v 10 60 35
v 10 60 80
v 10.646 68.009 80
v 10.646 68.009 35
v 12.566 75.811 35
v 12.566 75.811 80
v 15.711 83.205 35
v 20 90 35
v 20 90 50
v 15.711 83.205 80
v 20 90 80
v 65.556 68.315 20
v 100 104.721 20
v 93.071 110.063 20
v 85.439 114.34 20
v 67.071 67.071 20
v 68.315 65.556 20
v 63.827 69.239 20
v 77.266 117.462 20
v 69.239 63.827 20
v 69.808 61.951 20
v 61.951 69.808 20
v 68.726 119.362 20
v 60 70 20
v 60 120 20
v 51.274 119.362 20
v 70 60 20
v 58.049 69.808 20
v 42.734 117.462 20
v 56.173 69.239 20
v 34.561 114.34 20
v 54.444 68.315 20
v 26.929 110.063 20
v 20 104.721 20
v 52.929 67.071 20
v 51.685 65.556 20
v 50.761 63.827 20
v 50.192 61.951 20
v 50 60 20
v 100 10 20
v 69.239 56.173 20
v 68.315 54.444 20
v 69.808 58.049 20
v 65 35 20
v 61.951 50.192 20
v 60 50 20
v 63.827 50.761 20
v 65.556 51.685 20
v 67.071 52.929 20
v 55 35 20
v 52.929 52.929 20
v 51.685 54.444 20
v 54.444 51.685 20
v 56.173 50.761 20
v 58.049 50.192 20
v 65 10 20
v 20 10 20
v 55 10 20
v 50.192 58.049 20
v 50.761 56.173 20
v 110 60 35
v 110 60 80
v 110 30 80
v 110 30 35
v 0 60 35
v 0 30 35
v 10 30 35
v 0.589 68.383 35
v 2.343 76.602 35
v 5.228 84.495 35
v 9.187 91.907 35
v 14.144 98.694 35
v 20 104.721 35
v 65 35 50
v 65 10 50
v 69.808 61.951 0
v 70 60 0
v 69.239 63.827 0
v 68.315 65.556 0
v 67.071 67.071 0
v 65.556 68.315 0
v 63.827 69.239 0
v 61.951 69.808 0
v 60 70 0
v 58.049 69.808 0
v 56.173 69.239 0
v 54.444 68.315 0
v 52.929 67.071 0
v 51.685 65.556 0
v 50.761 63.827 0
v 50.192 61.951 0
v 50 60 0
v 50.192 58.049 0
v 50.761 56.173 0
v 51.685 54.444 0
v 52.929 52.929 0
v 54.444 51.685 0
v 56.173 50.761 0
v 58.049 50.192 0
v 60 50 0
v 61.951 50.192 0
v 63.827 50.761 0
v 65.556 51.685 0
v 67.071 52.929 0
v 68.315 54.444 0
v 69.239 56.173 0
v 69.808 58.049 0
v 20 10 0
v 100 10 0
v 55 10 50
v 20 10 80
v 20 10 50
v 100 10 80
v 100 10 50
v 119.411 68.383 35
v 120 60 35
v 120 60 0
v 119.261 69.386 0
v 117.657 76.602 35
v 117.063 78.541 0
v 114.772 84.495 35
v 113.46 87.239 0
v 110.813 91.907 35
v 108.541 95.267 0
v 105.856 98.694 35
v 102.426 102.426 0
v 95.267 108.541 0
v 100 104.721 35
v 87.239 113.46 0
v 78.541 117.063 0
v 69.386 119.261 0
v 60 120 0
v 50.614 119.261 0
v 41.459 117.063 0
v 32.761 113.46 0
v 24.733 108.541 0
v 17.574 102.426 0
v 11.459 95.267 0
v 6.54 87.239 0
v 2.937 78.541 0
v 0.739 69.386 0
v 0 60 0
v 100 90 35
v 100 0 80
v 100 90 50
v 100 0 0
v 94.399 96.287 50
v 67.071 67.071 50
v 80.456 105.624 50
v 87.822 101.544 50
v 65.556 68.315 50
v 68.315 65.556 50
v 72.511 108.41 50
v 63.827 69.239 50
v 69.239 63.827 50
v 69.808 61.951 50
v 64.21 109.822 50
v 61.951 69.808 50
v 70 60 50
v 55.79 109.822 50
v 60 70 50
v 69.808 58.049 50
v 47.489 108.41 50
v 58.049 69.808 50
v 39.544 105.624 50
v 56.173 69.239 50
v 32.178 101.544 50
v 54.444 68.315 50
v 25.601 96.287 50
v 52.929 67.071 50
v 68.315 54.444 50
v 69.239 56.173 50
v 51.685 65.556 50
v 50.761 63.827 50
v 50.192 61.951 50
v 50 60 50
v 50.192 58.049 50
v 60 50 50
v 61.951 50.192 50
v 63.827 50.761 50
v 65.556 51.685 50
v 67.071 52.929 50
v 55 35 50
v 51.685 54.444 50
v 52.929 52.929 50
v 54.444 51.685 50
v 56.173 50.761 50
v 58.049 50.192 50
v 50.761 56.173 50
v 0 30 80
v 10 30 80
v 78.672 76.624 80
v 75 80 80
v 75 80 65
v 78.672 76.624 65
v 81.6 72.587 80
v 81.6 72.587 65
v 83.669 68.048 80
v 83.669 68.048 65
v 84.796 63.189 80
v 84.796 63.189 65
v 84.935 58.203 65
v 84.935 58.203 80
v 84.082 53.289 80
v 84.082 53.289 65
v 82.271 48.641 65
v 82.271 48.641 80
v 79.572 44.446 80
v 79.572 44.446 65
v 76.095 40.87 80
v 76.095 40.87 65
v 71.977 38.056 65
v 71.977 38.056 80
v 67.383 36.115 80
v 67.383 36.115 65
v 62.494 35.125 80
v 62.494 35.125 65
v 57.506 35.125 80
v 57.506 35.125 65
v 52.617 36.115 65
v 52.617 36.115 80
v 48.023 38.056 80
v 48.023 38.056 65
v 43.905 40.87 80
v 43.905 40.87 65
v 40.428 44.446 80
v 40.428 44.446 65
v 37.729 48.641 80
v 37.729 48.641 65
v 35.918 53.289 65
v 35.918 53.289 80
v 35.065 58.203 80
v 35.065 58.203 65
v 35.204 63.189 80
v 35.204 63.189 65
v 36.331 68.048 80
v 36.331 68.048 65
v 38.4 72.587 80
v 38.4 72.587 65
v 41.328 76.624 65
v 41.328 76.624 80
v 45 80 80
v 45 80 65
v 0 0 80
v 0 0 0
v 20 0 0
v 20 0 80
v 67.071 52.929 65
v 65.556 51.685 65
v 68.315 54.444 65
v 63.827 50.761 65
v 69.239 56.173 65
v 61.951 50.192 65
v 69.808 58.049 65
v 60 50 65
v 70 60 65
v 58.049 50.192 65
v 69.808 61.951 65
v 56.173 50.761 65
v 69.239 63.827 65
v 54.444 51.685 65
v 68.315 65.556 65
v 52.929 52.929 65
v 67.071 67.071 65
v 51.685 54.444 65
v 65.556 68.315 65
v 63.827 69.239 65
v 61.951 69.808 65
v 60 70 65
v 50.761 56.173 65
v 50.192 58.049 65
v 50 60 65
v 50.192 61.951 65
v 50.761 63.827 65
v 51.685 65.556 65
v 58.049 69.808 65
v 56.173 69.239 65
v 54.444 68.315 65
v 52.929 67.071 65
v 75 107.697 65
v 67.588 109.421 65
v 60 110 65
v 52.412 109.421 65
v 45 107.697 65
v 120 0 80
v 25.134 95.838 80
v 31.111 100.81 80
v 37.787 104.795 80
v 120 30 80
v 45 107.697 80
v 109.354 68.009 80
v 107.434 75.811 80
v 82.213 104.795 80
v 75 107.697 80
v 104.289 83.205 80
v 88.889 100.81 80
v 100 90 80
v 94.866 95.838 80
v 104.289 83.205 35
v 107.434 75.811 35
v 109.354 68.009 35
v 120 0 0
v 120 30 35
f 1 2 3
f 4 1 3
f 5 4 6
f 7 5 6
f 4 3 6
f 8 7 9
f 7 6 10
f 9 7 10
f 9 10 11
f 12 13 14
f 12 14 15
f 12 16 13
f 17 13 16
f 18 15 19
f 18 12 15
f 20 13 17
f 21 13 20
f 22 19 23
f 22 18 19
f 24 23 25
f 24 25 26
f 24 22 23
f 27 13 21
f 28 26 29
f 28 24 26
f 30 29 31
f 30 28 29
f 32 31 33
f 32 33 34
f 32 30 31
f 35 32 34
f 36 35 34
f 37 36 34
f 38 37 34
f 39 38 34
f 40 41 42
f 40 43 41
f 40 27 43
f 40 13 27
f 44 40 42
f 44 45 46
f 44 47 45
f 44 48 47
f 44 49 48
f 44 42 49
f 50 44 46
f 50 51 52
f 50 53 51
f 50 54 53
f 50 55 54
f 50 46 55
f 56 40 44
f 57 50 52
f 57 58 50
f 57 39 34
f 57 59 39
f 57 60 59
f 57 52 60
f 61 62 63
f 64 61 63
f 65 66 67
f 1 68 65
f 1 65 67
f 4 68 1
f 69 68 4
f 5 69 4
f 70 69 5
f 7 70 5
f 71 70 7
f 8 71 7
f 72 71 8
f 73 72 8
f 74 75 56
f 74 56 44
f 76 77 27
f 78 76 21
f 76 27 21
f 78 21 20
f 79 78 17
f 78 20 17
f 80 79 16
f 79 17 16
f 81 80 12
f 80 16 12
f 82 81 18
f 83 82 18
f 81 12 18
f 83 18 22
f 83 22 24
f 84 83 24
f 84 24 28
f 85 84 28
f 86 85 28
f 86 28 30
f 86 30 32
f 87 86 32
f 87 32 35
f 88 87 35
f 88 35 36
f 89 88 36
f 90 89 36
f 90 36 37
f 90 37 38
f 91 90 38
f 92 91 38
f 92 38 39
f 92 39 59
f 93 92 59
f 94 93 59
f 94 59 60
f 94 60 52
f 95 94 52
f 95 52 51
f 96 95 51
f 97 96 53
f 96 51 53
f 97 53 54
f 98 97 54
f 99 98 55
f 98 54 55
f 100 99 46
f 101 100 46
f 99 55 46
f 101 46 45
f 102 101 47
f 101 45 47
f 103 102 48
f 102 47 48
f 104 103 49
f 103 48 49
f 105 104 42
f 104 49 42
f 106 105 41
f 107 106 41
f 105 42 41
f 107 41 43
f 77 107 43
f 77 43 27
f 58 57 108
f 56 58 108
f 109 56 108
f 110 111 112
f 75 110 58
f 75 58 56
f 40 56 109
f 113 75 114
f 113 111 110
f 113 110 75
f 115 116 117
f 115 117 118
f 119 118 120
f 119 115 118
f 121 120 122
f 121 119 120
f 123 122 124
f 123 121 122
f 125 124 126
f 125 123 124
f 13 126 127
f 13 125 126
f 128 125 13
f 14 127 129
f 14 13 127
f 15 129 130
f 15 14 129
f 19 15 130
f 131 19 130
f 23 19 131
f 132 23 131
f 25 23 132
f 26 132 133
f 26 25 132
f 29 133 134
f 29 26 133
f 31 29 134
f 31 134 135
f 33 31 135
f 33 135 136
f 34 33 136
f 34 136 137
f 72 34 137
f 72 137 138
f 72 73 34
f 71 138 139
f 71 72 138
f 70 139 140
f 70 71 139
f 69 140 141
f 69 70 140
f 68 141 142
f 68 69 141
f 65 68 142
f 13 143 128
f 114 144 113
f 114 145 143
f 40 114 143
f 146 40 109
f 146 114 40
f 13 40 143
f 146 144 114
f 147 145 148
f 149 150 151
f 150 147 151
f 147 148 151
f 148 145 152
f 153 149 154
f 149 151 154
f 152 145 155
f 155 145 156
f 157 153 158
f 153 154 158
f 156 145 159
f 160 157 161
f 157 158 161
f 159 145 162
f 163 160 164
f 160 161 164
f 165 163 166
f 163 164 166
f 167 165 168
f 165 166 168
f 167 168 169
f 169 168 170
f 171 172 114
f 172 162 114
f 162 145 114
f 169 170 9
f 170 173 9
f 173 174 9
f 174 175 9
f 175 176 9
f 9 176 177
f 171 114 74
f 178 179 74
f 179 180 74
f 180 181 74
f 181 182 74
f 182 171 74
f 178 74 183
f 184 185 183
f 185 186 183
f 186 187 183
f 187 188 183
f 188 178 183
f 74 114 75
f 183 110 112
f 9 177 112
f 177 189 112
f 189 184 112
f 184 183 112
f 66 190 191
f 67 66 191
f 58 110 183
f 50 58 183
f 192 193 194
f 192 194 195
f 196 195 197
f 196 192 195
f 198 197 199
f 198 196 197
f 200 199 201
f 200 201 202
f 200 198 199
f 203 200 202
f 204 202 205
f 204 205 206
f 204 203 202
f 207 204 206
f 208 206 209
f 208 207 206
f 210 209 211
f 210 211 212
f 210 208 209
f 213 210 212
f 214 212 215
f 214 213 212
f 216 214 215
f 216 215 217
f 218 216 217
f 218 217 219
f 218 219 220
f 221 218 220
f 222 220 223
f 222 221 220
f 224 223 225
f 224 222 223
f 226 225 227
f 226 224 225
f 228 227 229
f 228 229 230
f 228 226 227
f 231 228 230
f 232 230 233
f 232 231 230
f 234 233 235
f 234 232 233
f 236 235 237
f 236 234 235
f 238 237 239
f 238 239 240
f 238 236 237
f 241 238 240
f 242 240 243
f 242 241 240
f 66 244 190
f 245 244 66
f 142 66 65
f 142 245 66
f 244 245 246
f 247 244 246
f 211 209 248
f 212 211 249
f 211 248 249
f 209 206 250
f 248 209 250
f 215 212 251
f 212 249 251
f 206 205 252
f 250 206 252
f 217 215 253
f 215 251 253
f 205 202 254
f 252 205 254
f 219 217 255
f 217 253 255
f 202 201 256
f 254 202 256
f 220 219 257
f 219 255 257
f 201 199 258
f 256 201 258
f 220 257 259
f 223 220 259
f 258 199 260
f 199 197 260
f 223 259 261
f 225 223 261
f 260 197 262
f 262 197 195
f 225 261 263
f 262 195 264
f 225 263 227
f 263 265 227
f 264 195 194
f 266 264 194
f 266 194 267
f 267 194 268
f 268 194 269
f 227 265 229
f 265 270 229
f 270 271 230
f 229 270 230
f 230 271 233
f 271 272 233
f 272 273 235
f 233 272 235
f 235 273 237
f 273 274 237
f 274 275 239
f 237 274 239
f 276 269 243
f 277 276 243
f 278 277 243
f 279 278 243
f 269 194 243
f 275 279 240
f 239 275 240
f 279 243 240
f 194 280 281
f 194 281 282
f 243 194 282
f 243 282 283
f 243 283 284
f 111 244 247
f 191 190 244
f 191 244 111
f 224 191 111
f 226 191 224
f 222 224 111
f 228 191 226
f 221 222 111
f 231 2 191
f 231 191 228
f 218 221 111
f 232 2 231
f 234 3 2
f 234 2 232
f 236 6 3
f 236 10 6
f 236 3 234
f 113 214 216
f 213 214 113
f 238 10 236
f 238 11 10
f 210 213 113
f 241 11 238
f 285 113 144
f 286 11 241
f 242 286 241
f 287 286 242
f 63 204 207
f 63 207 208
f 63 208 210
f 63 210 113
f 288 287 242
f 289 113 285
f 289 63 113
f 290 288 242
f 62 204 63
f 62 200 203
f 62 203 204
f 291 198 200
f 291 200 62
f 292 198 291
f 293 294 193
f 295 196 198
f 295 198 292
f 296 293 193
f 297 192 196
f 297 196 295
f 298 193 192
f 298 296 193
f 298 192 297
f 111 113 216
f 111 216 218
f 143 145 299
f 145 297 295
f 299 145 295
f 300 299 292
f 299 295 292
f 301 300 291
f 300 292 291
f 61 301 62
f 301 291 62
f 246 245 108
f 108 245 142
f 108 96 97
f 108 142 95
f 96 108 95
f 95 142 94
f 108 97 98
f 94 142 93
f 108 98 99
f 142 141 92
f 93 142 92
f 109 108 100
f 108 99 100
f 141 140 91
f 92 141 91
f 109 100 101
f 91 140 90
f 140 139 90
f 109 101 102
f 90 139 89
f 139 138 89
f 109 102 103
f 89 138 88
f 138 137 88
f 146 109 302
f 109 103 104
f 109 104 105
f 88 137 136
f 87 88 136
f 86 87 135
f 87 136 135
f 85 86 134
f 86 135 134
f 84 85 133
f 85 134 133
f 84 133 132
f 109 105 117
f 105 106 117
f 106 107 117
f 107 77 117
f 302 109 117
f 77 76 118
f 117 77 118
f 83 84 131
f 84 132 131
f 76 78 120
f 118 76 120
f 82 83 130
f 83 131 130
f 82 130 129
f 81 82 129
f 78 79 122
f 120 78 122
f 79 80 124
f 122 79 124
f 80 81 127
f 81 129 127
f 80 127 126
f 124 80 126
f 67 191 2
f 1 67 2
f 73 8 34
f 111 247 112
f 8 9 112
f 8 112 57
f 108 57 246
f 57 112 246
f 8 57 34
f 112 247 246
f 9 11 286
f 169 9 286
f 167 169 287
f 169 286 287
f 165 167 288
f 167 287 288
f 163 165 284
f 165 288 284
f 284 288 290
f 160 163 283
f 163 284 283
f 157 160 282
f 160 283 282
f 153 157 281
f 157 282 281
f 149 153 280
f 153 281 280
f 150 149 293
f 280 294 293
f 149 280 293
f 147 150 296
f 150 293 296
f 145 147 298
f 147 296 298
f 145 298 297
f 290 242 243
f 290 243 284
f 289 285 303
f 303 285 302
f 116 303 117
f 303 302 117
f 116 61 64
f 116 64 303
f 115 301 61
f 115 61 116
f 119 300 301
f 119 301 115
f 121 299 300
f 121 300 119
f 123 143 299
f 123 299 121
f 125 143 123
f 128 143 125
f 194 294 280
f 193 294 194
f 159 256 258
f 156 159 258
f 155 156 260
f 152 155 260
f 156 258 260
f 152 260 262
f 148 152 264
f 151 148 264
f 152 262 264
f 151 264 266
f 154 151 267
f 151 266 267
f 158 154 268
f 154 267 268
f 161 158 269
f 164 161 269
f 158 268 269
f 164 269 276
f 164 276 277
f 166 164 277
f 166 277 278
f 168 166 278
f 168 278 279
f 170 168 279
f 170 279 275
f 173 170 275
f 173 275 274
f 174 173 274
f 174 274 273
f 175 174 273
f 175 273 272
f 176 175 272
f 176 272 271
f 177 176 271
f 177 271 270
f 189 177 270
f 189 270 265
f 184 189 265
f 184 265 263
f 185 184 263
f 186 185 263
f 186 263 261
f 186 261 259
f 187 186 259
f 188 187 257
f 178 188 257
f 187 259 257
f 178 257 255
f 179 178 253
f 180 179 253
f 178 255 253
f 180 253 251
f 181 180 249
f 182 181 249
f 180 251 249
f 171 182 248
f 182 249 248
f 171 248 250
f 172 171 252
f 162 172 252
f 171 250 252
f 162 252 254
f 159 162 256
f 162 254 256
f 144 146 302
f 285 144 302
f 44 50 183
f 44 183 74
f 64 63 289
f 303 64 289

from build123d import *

# Parameters (mm, degrees)
SKETCH1_W           = 120
SKETCH1_H           = 60
BOSS_EXTRUDE2_DEPTH = 80
SKETCH2_W           = 80
SKETCH2_H           = 10
CUT_EXTRUDE1_DEPTH  = 80
BOSS_EXTRUDE3_DEPTH = 80
SKETCH4_R           = 10
CUT_EXTRUDE2_DEPTH  = 80
CUT_EXTRUDE3_DEPTH  = 15
CUT_EXTRUDE4_DEPTH  = 45
CUT_EXTRUDE5_DEPTH  = 30
SKETCH13_W          = 80
SKETCH13_H          = 30
CUT_EXTRUDE12_DEPTH = 950
SKETCH14_W          = 10
SKETCH14_H          = 25
BOSS_EXTRUDE4_DEPTH = 30


with BuildPart() as part:
    # Sketch1 → Boss-Extrude2 (new body)
    with BuildSketch(Plane.XY):
        with Locations((60, 30)):
            Rectangle(SKETCH1_W, SKETCH1_H)
    extrude(amount=BOSS_EXTRUDE2_DEPTH)

    # Sketch2 → Cut-Extrude1 (cut)
    with BuildSketch(Plane.XY.offset(80)):
        with Locations((60, 5)):
            Rectangle(SKETCH2_W, SKETCH2_H)
    extrude(amount=-CUT_EXTRUDE1_DEPTH, mode=Mode.SUBTRACT)

    # Sketch3 → Boss-Extrude3 (add)
    with BuildSketch(Plane.XY.offset(80)):
        with BuildLine():
            Line((0, 60), (120, 60))
            ThreePointArc((120, 60), (60, 120), (0, 60))
        make_face()
    extrude(amount=-BOSS_EXTRUDE3_DEPTH)

    # Sketch4 → Cut-Extrude2 (cut)
    with BuildSketch(Plane.XY.offset(80)):
        with Locations((60, 60)):
            Circle(SKETCH4_R)
    extrude(amount=-CUT_EXTRUDE2_DEPTH, mode=Mode.SUBTRACT)

    # Sketch5 → Cut-Extrude3 (cut)
    with BuildSketch(Plane.XY.offset(80)):
        with BuildLine():
            Line((45, 80), (45, 118.094750193))
            ThreePointArc((45, 118.094750193), (60, 120.1113283), (75, 118.094750193))
            Line((75, 118.094750193), (75, 80))
            ThreePointArc((75, 80), (60, 35), (45, 80))
        make_face()
    extrude(amount=-CUT_EXTRUDE3_DEPTH, mode=Mode.SUBTRACT)

    # Sketch6 → Cut-Extrude4 (cut)
    with BuildSketch(Plane.XY.offset(80)):
        with BuildLine():
            Line((10, 30), (10, 60))
            ThreePointArc((10, 60), (12.565835097, 75.811388301), (20, 90))
            Line((20, 90), (20, 104.72135955))
            ThreePointArc((20, 104.72135955), (5.227744249, 84.494897428), (0, 60))
            Line((0, 60), (0, 30))
            Line((0, 30), (10, 30))
        make_face()
        with BuildLine():
            Line((100, 104.72135955), (100, 90))
            ThreePointArc((100, 90), (107.434164903, 75.811388301), (110, 60))
            Line((110, 60), (110, 30))
            Line((110, 30), (120, 30))
            Line((120, 30), (120, 60))
            ThreePointArc((120, 60), (114.772255751, 84.494897428), (100, 104.72135955))
        make_face()
    extrude(amount=-CUT_EXTRUDE4_DEPTH, mode=Mode.SUBTRACT)

    # Sketch7 → Cut-Extrude5 (cut)
    with BuildSketch(Plane.XY.offset(80)):
        with BuildLine():
            Line((0, 60), (10, 60))
            ThreePointArc((10, 60), (60, 110), (110, 60))
            Line((110, 60), (120, 60))
            ThreePointArc((120, 60), (60, 120), (0, 60))
        make_face()
    extrude(amount=-CUT_EXTRUDE5_DEPTH, mode=Mode.SUBTRACT)

    # Sketch13 → Cut-Extrude12 (cut)
    with BuildSketch(Plane(origin=(0, 10, 0), x_dir=(-1, 0, 0), z_dir=(0, -1, 0))):
        with Locations((-60, -35)):
            Rectangle(SKETCH13_W, SKETCH13_H)
    extrude(amount=-CUT_EXTRUDE12_DEPTH, mode=Mode.SUBTRACT)

    # Sketch14 → Boss-Extrude4 (add)
    with BuildSketch(Plane.XY.offset(20)):
        with Locations((60, 22.5)):
            Rectangle(SKETCH14_W, SKETCH14_H)
    extrude(amount=BOSS_EXTRUDE4_DEPTH)


solid = part.part
